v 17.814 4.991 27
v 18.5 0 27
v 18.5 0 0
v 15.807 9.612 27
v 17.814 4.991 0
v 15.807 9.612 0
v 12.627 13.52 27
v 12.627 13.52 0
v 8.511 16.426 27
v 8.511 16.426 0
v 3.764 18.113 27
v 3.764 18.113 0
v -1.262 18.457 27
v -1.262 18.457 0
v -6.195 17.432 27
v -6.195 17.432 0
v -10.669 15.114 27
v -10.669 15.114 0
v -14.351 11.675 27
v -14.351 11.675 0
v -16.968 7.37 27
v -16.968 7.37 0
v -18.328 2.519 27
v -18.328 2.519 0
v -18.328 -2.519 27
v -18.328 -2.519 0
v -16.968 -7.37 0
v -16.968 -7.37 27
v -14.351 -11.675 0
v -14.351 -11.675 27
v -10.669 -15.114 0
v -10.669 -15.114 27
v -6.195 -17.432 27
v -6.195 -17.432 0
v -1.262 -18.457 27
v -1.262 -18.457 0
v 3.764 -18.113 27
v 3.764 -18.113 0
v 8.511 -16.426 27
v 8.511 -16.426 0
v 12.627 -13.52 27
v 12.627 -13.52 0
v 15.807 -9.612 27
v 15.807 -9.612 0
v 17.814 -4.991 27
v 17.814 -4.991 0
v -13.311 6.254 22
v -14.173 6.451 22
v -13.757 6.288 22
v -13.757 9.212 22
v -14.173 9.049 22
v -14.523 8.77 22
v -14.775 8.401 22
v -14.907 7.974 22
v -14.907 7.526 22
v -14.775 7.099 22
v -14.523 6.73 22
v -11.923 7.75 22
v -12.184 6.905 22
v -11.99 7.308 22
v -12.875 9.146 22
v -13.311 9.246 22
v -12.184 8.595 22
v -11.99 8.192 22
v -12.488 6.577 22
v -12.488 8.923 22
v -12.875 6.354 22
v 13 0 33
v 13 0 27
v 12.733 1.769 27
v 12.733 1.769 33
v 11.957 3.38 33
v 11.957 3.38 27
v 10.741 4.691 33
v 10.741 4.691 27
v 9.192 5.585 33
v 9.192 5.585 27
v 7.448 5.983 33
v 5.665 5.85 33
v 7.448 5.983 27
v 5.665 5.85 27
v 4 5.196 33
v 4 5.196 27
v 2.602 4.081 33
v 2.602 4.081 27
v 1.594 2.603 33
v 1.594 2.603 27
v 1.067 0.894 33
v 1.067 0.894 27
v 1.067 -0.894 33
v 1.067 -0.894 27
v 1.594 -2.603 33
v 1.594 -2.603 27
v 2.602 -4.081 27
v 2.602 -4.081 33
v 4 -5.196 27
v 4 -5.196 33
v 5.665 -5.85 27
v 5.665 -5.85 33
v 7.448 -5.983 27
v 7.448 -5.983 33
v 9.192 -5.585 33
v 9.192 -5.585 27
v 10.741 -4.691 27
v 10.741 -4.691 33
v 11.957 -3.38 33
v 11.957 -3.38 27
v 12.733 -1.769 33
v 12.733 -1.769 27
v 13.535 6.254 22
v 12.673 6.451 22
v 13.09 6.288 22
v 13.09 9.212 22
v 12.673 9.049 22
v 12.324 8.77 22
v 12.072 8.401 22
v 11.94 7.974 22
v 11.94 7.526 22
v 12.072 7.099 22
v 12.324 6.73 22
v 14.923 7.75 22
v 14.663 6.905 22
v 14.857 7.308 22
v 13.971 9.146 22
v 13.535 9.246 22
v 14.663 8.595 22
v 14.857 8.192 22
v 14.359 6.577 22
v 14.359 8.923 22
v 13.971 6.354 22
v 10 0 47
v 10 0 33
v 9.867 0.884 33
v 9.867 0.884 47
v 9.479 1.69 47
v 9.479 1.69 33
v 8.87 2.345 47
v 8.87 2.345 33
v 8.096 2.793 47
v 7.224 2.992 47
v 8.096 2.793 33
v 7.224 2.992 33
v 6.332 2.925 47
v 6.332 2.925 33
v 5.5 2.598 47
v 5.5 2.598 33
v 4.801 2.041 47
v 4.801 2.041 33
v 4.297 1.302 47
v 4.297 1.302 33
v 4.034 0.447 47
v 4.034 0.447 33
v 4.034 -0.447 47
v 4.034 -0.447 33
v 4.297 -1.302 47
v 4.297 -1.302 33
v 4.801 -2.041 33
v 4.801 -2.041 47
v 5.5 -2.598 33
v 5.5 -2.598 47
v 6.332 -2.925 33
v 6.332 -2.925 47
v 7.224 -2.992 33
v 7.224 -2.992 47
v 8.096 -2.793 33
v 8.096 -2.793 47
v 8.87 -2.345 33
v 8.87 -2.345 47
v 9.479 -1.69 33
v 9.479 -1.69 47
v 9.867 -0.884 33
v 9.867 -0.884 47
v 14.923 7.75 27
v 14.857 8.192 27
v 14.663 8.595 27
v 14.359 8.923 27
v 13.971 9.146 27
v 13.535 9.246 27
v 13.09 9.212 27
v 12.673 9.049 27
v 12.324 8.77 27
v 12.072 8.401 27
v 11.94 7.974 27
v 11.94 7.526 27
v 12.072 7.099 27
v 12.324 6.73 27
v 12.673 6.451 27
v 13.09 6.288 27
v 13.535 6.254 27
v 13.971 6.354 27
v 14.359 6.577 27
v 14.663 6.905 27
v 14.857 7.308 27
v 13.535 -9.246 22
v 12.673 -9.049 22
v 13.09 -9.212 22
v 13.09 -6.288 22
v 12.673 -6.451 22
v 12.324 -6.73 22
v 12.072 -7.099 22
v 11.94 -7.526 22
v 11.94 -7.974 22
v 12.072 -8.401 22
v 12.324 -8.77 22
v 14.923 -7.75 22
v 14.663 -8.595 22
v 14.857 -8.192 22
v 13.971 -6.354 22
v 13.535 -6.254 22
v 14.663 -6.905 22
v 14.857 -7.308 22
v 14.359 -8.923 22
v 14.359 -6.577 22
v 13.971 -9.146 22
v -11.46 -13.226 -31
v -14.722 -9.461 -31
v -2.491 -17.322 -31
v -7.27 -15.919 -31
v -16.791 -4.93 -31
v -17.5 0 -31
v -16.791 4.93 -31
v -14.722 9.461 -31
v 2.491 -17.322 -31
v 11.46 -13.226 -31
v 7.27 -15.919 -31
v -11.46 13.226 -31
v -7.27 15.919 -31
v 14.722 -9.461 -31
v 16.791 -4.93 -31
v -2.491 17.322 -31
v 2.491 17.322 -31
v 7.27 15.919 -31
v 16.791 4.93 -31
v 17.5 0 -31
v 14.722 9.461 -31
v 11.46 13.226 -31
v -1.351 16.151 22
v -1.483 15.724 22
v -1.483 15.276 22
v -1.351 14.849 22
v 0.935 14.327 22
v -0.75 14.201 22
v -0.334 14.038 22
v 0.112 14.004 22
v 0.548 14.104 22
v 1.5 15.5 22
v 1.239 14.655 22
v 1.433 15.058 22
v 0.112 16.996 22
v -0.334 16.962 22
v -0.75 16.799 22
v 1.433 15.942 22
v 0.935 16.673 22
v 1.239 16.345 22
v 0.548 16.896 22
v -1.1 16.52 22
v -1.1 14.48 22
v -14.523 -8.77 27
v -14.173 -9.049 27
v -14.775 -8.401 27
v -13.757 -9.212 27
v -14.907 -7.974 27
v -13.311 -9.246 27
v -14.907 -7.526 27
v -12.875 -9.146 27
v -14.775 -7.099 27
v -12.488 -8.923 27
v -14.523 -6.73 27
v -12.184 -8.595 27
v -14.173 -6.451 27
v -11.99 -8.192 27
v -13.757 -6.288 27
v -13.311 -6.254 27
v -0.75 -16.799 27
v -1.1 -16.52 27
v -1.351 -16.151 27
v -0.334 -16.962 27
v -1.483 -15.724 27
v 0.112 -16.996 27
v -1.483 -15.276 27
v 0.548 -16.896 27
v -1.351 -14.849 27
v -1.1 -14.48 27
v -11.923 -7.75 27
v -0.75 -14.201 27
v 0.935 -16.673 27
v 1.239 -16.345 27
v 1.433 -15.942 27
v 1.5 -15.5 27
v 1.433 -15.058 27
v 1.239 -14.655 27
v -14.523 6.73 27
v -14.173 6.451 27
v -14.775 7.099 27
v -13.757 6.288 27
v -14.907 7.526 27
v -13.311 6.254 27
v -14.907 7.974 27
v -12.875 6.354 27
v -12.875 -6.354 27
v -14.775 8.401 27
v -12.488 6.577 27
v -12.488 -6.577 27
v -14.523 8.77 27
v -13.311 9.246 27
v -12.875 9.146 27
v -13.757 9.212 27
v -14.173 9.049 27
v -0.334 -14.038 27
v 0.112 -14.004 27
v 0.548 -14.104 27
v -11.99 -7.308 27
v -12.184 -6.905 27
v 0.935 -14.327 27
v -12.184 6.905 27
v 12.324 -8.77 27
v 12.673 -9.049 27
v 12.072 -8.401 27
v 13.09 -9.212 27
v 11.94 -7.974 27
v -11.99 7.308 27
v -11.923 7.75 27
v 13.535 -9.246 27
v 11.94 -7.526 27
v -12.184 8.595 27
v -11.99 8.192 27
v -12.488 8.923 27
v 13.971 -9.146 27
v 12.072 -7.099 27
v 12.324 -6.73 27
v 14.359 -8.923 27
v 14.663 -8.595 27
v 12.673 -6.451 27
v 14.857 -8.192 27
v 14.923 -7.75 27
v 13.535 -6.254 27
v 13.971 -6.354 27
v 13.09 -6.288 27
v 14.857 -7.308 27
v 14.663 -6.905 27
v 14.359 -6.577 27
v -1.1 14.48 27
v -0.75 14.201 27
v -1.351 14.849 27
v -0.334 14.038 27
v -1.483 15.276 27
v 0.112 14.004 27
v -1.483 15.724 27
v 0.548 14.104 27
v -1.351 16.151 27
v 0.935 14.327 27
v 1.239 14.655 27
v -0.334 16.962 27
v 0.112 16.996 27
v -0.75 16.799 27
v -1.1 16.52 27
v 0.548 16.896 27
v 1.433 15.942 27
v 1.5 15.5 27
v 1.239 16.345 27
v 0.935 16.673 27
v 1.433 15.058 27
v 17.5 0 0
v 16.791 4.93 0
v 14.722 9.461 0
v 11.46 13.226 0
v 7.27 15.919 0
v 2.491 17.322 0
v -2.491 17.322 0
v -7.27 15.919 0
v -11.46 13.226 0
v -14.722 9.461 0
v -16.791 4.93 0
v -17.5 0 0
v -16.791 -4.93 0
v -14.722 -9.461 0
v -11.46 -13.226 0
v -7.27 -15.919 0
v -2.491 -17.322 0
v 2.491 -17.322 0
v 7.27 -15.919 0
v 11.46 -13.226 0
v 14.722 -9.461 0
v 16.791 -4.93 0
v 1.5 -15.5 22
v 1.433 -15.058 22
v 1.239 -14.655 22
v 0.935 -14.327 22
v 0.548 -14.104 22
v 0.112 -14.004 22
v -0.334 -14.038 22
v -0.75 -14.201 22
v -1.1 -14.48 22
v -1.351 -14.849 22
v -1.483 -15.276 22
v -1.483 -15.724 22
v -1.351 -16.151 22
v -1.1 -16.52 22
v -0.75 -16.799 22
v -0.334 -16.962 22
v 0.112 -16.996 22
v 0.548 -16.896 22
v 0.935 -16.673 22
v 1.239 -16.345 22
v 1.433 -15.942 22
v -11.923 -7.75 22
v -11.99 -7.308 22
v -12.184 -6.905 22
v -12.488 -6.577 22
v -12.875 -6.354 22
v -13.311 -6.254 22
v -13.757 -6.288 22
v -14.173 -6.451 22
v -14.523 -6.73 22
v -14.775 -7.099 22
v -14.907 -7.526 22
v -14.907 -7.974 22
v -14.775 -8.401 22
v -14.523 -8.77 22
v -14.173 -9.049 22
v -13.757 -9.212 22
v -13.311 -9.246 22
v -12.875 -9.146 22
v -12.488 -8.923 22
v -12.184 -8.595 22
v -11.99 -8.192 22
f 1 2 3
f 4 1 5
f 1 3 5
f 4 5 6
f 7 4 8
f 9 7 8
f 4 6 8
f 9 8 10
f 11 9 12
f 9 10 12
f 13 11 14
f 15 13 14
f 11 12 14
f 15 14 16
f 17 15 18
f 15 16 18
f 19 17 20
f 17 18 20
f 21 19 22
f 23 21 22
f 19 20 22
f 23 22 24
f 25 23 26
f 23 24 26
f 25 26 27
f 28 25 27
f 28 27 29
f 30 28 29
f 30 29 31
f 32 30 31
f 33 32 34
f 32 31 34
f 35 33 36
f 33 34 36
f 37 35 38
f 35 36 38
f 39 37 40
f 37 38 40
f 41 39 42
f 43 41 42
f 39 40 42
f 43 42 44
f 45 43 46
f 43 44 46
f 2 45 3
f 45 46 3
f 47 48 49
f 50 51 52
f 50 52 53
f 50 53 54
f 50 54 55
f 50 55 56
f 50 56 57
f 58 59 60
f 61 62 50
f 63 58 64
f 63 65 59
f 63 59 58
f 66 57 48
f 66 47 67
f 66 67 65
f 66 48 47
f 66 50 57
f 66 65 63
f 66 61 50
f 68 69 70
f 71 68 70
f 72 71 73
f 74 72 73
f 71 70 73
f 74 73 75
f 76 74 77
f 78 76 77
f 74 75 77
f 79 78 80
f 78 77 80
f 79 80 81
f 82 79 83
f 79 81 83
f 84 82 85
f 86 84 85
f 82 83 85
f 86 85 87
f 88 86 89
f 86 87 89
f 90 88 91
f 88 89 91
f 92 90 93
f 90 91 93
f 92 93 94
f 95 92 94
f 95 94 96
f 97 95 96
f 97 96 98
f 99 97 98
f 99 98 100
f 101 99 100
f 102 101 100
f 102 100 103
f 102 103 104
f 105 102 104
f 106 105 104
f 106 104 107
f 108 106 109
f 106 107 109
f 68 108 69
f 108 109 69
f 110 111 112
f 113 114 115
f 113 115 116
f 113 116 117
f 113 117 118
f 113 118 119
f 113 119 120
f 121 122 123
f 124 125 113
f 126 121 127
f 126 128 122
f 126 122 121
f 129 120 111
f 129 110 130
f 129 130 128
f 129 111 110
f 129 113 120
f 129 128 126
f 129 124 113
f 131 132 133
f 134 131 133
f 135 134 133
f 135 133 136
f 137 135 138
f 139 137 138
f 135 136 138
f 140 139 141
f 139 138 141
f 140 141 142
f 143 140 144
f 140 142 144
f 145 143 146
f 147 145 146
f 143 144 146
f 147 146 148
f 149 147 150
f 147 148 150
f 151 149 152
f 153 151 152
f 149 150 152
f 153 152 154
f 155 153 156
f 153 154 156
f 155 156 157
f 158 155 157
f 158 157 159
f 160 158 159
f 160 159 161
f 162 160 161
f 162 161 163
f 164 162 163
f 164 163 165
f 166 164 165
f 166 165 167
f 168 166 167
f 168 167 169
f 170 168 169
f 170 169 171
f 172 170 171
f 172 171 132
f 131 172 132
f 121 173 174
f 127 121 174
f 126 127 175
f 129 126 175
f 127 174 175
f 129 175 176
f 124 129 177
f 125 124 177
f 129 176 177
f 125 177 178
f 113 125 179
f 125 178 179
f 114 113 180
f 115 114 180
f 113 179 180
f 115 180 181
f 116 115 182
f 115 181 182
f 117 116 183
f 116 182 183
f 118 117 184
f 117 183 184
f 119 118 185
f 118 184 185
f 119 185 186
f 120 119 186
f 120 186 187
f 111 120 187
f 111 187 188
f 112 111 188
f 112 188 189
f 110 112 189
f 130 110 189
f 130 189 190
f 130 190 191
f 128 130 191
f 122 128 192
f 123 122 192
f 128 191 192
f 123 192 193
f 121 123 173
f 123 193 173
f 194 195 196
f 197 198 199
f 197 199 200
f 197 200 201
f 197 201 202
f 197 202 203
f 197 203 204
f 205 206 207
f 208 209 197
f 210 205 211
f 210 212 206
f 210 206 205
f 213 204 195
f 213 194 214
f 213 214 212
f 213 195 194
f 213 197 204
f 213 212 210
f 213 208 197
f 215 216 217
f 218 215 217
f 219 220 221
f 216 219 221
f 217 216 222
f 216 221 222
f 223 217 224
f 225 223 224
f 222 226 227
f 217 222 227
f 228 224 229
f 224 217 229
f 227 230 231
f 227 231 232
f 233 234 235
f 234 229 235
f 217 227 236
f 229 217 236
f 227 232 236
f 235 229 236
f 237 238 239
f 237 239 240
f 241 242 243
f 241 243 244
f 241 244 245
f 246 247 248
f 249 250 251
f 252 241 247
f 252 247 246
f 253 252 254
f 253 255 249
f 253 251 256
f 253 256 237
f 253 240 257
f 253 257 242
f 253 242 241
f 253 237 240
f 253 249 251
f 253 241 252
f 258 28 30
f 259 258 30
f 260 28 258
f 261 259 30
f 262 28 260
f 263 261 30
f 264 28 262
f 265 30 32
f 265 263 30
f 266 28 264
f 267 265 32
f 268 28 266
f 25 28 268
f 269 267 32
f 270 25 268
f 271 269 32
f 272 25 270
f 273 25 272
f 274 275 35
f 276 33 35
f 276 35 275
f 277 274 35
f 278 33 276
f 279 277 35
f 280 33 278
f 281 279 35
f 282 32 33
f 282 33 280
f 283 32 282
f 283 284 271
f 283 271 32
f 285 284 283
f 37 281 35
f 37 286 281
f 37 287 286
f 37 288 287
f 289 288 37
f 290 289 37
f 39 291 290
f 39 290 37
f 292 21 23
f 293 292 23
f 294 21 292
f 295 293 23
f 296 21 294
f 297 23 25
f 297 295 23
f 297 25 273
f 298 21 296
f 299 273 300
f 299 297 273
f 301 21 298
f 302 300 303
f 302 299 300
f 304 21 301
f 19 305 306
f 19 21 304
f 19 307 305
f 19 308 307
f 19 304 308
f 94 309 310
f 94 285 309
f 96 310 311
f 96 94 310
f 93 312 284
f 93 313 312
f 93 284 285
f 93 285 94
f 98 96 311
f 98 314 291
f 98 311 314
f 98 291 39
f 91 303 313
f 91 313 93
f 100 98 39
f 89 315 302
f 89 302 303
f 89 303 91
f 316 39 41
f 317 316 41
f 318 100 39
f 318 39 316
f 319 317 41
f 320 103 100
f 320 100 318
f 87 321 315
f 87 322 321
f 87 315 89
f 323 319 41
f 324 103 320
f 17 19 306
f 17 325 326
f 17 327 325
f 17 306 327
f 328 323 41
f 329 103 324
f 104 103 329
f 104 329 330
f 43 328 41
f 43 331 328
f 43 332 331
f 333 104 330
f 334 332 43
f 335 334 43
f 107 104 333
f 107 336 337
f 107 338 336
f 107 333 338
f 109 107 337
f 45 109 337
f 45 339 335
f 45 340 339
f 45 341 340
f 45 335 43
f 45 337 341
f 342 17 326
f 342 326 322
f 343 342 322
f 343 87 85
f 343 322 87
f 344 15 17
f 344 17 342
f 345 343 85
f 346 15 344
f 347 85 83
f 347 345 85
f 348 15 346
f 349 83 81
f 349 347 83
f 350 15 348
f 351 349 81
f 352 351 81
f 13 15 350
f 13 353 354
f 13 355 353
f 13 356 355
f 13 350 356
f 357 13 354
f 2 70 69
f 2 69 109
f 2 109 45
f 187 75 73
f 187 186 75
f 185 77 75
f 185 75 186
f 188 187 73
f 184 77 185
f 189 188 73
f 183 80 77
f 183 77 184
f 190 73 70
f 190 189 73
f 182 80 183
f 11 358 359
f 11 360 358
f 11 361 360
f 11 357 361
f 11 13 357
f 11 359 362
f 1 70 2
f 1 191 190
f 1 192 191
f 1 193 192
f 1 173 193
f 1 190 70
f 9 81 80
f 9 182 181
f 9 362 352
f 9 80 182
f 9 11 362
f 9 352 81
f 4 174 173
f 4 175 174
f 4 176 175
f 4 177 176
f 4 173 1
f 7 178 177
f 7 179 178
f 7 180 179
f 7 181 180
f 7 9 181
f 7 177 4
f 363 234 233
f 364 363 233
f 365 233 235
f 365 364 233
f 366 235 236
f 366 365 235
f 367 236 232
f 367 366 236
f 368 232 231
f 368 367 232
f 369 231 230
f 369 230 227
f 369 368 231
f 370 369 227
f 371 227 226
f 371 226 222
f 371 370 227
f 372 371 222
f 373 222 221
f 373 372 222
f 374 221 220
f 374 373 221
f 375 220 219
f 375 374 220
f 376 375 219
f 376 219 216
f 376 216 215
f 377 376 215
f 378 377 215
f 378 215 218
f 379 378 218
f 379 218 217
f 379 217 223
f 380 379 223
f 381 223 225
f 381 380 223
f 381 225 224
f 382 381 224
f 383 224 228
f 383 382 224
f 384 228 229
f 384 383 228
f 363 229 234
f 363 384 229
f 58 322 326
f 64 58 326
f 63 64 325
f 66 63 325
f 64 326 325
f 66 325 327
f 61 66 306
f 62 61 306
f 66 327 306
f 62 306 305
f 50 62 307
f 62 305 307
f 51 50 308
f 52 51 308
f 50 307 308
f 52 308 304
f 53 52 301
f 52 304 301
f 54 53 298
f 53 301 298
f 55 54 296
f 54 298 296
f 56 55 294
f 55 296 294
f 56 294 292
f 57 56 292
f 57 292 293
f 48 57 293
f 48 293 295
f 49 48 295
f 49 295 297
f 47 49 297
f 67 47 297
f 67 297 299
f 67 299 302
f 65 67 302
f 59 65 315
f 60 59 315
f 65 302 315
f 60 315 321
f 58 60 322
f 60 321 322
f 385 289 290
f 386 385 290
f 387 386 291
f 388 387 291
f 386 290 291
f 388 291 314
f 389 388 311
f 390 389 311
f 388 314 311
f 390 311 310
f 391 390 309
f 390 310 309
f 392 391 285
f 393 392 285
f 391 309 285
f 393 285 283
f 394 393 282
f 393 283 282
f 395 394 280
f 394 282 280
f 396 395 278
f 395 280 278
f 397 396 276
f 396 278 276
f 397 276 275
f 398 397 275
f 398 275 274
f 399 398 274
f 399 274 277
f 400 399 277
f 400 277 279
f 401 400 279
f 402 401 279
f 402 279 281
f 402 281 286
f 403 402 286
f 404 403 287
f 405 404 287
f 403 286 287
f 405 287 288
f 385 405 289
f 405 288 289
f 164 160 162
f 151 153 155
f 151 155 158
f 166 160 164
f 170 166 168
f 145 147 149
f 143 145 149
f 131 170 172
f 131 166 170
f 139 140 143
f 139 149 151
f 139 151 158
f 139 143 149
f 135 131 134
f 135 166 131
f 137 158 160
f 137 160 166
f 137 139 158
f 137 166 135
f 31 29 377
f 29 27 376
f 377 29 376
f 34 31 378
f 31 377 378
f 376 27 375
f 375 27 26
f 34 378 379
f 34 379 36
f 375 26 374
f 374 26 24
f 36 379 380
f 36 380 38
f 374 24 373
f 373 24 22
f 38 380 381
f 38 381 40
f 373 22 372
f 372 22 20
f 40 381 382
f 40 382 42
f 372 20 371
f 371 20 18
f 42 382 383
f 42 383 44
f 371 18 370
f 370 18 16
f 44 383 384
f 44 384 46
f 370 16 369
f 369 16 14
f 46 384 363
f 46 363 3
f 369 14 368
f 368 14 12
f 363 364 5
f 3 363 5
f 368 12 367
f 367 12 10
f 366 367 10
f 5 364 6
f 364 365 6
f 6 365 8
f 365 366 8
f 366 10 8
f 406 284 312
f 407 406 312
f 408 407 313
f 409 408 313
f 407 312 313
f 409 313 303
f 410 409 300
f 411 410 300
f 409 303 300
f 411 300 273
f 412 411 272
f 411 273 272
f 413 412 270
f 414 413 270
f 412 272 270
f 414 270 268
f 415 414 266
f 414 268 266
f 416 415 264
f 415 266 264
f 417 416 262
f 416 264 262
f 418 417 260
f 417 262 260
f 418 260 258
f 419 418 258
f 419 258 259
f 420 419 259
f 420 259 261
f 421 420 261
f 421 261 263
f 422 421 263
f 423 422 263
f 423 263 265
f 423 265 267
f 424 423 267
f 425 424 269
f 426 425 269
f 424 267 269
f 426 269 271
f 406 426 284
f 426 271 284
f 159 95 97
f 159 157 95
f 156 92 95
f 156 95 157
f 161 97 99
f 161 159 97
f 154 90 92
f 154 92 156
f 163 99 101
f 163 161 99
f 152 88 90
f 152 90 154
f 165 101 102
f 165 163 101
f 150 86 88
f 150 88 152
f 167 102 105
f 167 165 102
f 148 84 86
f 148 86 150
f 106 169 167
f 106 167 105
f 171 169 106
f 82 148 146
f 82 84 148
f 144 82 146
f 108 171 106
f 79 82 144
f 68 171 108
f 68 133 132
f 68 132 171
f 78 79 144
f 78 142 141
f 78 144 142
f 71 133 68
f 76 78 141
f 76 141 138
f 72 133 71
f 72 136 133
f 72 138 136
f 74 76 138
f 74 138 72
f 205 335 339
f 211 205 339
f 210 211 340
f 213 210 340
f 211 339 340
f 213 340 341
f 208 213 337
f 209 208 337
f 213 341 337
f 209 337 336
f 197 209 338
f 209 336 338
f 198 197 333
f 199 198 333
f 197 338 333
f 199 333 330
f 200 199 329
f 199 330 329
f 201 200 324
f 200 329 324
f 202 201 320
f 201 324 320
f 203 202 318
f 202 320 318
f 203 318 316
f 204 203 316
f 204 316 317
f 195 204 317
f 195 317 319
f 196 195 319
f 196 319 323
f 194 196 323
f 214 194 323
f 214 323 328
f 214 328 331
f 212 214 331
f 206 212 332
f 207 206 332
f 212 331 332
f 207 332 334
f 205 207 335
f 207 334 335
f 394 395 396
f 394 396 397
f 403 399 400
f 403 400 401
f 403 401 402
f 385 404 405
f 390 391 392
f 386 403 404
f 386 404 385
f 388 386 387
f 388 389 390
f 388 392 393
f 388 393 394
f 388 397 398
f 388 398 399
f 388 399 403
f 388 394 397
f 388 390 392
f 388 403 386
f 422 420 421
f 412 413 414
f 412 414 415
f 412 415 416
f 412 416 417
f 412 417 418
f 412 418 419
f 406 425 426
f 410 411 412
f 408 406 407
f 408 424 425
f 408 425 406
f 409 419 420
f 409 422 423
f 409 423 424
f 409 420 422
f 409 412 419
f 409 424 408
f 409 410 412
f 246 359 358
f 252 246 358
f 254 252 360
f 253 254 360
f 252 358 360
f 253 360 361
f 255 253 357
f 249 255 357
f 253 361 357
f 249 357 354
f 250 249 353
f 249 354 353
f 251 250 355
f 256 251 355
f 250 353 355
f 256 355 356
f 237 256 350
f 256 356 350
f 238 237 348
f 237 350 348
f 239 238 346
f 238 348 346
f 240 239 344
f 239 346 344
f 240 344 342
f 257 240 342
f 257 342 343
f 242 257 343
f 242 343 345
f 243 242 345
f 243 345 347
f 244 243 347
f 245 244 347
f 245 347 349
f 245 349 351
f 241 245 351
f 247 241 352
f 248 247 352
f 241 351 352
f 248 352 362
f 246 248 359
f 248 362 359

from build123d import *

# Parameters (mm, degrees)
F0_R     = 18.5
F0_R_2   = 17.5
F1_DEPTH = 27
F2_DEPTH = 31
F3_R     = 1.5
F4_DEPTH = 5
F3_R_2   = 6
F3_R_3   = 3
F5_DEPTH = 6
F6_DEPTH = 20


with BuildPart() as f1:
    # F0 (on Top) → F1 (new body)
    with BuildSketch(Plane.XY):
        Circle(F0_R)
        Circle(F0_R_2, mode=Mode.SUBTRACT)
        Circle(F0_R_2)
    extrude(amount=F1_DEPTH)

    # F0 (on Top) → F2 (join)
    with BuildSketch(Plane.XY):
        Circle(F0_R_2)
    extrude(amount=-F2_DEPTH)

    # F3 (on face) → F4 (cut)
    with BuildSketch(Plane.XY.offset(27)):
        with Locations((0, 15.5)):
            Circle(F3_R)
        with Locations((13.4233937587, 7.75)):
            Circle(F3_R)
        with Locations((13.4233937587, -7.75)):
            Circle(F3_R)
        with Locations((0, -15.5)):
            Circle(F3_R)
        with Locations((-13.4233937587, -7.75)):
            Circle(F3_R)
        with Locations((-13.4233937587, 7.75)):
            Circle(F3_R)
    extrude(amount=-F4_DEPTH, mode=Mode.SUBTRACT)

    # F3 (on face) → F5 (join)
    with BuildSketch(Plane.XY.offset(27)):
        with Locations((7, 0)):
            Circle(F3_R_2)
        with Locations((7, 0)):
            Circle(F3_R_3, mode=Mode.SUBTRACT)
    extrude(amount=F5_DEPTH)

    # F6 (add): a face of the model
    f6_faces = [f1.faces().sort_by_distance(p)[0] for p in [
        (7, 0, 27),
    ]]
    extrude(f6_faces, amount=F6_DEPTH)


solid = f1.part
